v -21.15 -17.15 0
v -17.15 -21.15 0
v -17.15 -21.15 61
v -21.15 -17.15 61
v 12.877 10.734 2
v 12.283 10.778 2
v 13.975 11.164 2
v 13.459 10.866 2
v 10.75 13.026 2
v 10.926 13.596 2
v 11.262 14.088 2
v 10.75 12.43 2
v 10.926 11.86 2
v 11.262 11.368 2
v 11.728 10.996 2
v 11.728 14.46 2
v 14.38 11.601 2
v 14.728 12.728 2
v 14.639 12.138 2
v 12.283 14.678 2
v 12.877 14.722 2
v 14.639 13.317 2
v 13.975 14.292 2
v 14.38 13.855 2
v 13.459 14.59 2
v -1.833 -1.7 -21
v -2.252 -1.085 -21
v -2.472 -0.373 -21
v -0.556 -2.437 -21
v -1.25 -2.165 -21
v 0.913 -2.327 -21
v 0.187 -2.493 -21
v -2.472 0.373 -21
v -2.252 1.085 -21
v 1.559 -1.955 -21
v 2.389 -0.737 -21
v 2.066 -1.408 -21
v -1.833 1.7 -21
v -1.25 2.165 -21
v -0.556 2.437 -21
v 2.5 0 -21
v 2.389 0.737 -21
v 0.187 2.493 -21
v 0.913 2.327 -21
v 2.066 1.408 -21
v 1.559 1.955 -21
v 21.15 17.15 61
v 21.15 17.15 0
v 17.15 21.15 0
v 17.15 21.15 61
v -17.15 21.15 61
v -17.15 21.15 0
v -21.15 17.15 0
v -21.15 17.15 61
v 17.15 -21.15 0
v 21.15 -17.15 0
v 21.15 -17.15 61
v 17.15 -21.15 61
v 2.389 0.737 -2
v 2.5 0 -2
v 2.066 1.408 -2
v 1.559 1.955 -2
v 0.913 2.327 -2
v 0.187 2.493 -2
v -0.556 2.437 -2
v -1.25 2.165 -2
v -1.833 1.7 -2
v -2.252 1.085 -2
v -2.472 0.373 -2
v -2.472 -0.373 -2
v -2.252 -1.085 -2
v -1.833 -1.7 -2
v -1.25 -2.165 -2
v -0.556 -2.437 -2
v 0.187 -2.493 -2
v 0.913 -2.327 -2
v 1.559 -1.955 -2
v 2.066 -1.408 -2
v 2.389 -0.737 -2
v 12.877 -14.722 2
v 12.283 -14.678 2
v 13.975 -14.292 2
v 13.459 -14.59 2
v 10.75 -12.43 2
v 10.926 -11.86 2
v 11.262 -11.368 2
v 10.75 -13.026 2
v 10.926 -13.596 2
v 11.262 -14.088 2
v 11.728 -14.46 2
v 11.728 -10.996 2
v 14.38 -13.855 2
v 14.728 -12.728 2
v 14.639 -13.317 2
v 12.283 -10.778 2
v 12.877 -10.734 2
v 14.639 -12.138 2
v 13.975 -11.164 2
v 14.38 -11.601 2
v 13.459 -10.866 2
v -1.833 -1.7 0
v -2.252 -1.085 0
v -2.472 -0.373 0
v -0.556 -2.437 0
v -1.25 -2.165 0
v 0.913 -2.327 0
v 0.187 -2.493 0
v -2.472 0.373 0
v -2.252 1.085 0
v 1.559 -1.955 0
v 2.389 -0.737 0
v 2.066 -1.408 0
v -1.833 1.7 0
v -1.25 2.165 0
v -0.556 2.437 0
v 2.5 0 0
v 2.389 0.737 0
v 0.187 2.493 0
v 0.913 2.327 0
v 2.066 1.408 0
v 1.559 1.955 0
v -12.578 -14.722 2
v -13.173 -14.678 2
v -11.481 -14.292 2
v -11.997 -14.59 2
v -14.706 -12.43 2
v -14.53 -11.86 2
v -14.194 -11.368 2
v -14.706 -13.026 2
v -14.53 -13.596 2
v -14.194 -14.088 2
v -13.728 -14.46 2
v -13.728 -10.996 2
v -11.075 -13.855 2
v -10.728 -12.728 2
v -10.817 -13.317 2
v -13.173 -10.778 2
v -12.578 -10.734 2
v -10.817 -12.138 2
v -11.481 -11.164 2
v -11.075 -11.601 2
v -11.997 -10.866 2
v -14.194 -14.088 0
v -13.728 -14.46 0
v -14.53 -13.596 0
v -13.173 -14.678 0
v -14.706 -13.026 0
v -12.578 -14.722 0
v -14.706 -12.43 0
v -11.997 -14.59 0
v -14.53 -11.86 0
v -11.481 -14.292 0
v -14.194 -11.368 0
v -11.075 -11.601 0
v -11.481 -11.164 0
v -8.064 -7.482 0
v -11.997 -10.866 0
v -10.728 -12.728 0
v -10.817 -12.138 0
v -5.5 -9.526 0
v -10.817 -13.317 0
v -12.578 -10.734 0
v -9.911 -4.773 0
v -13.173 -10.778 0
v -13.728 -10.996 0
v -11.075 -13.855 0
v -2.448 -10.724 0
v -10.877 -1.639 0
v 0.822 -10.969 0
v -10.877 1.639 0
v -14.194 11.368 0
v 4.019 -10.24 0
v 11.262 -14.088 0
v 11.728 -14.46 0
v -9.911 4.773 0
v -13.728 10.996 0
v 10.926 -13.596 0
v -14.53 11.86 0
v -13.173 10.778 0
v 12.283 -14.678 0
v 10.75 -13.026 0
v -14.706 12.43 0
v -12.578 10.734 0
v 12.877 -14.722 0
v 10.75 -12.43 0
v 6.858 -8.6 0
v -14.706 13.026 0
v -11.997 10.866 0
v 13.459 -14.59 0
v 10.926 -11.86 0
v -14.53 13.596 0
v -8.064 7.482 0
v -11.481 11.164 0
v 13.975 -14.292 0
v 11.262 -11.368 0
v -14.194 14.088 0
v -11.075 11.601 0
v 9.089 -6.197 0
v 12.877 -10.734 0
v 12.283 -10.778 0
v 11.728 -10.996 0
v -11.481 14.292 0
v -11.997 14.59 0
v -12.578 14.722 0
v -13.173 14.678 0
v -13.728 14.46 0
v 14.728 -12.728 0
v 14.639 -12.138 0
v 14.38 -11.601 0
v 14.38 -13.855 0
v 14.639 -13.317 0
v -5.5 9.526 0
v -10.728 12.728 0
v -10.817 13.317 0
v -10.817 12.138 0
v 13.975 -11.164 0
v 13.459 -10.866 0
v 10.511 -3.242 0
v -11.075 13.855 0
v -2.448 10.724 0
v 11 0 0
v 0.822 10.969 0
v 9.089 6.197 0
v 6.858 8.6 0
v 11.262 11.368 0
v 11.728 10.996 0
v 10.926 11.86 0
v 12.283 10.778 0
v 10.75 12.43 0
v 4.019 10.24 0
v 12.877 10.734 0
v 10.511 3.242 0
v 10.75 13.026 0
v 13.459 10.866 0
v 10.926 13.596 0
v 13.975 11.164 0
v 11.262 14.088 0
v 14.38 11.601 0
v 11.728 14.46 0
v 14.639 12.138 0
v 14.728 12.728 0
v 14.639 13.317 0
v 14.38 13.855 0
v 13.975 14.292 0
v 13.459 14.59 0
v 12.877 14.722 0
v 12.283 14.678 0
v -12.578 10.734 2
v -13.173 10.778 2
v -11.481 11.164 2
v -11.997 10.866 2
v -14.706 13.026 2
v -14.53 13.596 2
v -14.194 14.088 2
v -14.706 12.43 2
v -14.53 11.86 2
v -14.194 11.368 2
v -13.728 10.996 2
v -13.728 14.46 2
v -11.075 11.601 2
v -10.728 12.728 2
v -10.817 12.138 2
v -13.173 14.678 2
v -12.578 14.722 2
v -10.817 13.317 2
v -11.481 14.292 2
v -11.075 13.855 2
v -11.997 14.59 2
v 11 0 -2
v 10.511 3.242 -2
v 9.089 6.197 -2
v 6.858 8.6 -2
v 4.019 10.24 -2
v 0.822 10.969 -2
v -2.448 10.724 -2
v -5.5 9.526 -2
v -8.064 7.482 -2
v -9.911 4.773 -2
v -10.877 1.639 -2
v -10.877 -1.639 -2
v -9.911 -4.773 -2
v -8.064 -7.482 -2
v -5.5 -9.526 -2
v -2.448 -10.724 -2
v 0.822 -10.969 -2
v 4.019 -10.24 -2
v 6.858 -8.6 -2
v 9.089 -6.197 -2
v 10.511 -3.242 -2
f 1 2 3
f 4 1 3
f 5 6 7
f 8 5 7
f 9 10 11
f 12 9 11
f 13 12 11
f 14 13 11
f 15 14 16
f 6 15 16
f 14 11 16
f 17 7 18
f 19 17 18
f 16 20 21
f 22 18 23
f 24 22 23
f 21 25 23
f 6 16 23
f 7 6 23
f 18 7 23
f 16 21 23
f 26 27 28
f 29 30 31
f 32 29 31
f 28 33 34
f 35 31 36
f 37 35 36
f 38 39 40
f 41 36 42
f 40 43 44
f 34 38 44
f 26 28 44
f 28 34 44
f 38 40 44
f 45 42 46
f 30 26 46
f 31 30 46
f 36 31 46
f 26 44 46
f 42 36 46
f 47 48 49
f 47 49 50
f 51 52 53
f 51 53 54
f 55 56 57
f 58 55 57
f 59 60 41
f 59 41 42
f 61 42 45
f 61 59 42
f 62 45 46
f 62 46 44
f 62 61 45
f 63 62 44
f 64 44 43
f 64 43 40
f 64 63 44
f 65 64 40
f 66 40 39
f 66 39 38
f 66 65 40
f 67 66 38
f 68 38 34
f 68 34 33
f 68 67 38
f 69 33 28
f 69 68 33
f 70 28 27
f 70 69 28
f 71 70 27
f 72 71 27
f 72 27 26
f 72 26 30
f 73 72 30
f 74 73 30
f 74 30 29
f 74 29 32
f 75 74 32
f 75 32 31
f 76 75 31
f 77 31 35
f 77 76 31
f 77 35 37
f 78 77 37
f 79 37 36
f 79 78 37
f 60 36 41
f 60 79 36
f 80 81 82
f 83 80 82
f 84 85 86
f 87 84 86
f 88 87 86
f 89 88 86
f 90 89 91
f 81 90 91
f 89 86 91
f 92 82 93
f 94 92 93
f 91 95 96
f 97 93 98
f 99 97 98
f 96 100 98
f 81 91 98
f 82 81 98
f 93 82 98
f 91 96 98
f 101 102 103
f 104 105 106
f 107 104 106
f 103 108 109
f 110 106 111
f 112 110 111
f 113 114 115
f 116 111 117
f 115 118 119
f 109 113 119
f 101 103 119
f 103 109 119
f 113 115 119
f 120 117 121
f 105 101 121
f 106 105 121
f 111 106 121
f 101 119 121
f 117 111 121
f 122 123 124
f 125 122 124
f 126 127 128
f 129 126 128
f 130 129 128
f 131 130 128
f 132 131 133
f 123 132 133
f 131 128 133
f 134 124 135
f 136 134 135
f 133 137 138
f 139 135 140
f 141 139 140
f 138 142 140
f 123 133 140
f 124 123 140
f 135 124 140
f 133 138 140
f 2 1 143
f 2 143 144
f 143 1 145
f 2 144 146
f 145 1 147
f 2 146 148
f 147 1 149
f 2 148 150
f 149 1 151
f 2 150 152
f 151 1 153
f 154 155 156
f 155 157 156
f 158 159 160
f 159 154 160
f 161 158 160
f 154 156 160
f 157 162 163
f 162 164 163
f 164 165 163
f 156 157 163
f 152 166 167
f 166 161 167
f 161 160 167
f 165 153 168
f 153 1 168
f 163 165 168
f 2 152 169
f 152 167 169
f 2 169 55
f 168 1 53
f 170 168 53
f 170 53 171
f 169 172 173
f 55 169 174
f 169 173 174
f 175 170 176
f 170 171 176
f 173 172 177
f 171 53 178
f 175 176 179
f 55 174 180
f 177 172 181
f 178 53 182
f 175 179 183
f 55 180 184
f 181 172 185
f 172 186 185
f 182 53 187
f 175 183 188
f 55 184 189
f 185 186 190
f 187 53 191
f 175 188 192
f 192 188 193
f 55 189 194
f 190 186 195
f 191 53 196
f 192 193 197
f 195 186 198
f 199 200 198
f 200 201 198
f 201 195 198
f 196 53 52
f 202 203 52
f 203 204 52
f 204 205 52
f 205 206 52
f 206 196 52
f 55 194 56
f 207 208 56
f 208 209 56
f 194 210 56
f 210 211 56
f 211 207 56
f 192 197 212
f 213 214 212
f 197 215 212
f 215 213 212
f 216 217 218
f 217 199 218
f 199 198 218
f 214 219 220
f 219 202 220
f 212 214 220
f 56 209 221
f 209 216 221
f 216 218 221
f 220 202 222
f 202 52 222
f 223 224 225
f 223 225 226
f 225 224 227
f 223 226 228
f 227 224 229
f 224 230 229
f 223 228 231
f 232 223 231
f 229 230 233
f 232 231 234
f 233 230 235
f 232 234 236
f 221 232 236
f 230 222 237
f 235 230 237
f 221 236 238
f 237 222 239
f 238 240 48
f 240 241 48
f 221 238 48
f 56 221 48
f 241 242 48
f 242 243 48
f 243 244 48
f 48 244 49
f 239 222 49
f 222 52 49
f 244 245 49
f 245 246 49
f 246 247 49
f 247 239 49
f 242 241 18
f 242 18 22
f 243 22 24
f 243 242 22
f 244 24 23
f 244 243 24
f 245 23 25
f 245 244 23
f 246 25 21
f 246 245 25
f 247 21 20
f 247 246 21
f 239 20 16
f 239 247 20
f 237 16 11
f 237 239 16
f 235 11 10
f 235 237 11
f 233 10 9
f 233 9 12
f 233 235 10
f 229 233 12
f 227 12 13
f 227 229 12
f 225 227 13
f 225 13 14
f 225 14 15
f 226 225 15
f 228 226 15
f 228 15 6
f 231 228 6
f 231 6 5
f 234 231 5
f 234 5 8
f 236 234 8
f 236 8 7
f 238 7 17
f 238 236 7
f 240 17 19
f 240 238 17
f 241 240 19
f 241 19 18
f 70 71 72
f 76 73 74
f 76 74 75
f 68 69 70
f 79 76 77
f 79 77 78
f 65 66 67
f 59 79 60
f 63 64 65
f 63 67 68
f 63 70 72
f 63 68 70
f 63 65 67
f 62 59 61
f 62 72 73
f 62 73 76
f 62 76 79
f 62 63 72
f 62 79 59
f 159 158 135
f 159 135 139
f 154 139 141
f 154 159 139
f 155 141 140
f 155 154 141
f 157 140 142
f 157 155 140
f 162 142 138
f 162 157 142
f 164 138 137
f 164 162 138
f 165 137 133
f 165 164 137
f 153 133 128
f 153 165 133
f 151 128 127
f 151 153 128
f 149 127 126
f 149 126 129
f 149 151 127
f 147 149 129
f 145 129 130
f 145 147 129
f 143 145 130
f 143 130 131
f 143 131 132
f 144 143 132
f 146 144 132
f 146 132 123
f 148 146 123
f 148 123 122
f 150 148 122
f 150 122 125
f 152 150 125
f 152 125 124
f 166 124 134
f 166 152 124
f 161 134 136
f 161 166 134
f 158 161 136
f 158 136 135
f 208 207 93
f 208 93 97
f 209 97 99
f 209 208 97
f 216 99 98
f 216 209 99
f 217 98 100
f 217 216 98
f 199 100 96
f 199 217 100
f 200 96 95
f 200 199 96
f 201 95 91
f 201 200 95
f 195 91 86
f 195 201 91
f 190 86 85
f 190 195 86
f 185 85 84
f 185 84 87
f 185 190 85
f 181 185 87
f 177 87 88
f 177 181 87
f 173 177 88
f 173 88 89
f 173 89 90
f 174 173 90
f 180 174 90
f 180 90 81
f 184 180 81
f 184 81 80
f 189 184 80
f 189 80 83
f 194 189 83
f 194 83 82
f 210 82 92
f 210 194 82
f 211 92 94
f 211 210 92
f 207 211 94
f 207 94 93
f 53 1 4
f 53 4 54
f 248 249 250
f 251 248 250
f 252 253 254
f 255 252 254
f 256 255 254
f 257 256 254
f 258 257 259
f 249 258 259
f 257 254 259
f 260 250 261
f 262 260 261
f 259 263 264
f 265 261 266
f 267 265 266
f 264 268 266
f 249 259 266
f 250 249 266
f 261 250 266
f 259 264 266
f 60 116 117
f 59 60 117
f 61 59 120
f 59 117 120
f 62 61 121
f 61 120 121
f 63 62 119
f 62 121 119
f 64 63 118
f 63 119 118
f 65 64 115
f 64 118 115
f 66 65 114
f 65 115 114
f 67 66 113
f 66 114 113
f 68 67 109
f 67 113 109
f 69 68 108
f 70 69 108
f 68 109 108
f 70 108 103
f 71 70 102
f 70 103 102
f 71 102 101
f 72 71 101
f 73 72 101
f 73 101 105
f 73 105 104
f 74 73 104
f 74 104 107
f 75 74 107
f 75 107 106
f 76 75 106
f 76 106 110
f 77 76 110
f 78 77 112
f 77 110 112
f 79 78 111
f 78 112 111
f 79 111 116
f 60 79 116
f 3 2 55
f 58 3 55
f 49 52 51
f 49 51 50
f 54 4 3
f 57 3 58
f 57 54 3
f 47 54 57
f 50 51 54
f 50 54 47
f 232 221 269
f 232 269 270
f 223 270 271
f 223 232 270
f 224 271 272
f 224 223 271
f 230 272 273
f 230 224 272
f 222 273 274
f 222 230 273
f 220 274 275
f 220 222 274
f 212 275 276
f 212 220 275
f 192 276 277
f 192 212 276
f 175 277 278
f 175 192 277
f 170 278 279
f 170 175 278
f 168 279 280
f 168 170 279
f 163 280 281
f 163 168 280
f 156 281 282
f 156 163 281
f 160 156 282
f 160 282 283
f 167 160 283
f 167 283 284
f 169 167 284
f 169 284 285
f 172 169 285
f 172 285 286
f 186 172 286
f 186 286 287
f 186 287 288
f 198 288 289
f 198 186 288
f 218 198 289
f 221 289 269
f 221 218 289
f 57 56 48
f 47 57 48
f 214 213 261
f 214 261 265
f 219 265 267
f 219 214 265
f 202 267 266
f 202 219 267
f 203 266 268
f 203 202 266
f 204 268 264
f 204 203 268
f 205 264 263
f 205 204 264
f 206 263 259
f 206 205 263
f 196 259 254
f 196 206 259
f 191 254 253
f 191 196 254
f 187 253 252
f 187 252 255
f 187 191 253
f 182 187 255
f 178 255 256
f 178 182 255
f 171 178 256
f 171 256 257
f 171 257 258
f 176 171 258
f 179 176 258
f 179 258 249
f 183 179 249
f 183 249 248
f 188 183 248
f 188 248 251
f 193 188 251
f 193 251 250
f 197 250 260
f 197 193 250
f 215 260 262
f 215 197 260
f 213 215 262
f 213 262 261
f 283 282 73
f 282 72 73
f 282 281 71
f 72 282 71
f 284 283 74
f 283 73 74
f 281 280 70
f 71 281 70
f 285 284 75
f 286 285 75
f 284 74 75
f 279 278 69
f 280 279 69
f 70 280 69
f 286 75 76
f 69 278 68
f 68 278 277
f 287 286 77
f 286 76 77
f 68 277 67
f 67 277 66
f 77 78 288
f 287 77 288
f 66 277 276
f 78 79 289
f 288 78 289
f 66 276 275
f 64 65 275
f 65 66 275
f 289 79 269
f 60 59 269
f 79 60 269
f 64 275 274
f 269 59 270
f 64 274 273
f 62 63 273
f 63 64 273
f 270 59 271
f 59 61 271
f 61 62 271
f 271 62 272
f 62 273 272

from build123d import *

# Parameters (mm, degrees)
SKETCH1_W           = 42.3
SKETCH1_H           = 42.3
SKETCH1_R           = 2
SKETCH1_R_2         = 11
SKETCH1_R_3         = 2.5
BOSS_EXTRUDE1_DEPTH = 61
SKETCH1_3_R         = 11
SKETCH1_3_R_2       = 2.5
BOSS_EXTRUDE2_DEPTH = 2
SKETCH1_4_R         = 2
CUT_EXTRUDE1_DEPTH  = 2
BOSS_EXTRUDE3_START = -2
SKETCH1_5_R         = 2.5
BOSS_EXTRUDE3_DEPTH = 19
CHAMFER1_SIZE       = 4


with BuildPart() as part:
    # Sketch1 → Boss-Extrude1 (new body)
    # profile 1 of 7: a face of its own
    with BuildSketch(Plane.XY):
        Rectangle(SKETCH1_W, SKETCH1_H)
        with Locations((-12.727922061, -12.727922061)):
            Circle(SKETCH1_R, mode=Mode.SUBTRACT)
        with Locations((12.727922061, -12.727922061)):
            Circle(SKETCH1_R, mode=Mode.SUBTRACT)
        with Locations((12.727922061, 12.727922061)):
            Circle(SKETCH1_R, mode=Mode.SUBTRACT)
        with Locations((-12.727922061, 12.727922061)):
            Circle(SKETCH1_R, mode=Mode.SUBTRACT)
        Circle(SKETCH1_R_2, mode=Mode.SUBTRACT)
    # profile 2 of 7: a face of its own
    with BuildSketch(Plane.XY):
        Circle(SKETCH1_R_2)
        Circle(SKETCH1_R_3, mode=Mode.SUBTRACT)
    # profile 3 of 7: a face of its own
    with BuildSketch(Plane.XY):
        with Locations((-12.727922061, -12.727922061)):
            Circle(SKETCH1_R)
    # profile 4 of 7: a face of its own
    with BuildSketch(Plane.XY):
        with Locations((-12.727922061, 12.727922061)):
            Circle(SKETCH1_R)
    # profile 5 of 7: a face of its own
    with BuildSketch(Plane.XY):
        with Locations((12.727922061, 12.727922061)):
            Circle(SKETCH1_R)
    # profile 6 of 7: a face of its own
    with BuildSketch(Plane.XY):
        with Locations((12.727922061, -12.727922061)):
            Circle(SKETCH1_R)
    # profile 7 of 7: a face of its own
    with BuildSketch(Plane.XY):
        Circle(SKETCH1_R_3)
    extrude(amount=BOSS_EXTRUDE1_DEPTH)

    # Sketch1<3> → Boss-Extrude2 (add)
    with BuildSketch(Plane.XY):
        Circle(SKETCH1_3_R)
        Circle(SKETCH1_3_R_2, mode=Mode.SUBTRACT)
    extrude(amount=-BOSS_EXTRUDE2_DEPTH)

    # Sketch1<4> → Cut-Extrude1 (cut)
    with BuildSketch(Plane.XY):
        with Locations((12.727922061, 12.727922061)):
            Circle(SKETCH1_4_R)
        with Locations((-12.727922061, 12.727922061)):
            Circle(SKETCH1_4_R)
        with Locations((-12.727922061, -12.727922061)):
            Circle(SKETCH1_4_R)
        with Locations((12.727922061, -12.727922061)):
            Circle(SKETCH1_4_R)
    extrude(amount=CUT_EXTRUDE1_DEPTH, mode=Mode.SUBTRACT)

    # Chamfer1
    chamfer1_edges = [part.edges().sort_by_distance(p)[0] for p in [
        (21.15, -21.15, 30.5),
        (-21.15, -21.15, 30.5),
        (-21.15, 21.15, 30.5),
        (21.15, 21.15, 30.5),
    ]]
    chamfer(chamfer1_edges, length=CHAMFER1_SIZE)


with BuildPart() as body_2:
    # Sketch1<5> → Boss-Extrude3 (new body)
    with BuildSketch(Plane.XY.offset(BOSS_EXTRUDE3_START)):
        Circle(SKETCH1_5_R)
    extrude(amount=-BOSS_EXTRUDE3_DEPTH)


solid = Compound([part.part, body_2.part])
